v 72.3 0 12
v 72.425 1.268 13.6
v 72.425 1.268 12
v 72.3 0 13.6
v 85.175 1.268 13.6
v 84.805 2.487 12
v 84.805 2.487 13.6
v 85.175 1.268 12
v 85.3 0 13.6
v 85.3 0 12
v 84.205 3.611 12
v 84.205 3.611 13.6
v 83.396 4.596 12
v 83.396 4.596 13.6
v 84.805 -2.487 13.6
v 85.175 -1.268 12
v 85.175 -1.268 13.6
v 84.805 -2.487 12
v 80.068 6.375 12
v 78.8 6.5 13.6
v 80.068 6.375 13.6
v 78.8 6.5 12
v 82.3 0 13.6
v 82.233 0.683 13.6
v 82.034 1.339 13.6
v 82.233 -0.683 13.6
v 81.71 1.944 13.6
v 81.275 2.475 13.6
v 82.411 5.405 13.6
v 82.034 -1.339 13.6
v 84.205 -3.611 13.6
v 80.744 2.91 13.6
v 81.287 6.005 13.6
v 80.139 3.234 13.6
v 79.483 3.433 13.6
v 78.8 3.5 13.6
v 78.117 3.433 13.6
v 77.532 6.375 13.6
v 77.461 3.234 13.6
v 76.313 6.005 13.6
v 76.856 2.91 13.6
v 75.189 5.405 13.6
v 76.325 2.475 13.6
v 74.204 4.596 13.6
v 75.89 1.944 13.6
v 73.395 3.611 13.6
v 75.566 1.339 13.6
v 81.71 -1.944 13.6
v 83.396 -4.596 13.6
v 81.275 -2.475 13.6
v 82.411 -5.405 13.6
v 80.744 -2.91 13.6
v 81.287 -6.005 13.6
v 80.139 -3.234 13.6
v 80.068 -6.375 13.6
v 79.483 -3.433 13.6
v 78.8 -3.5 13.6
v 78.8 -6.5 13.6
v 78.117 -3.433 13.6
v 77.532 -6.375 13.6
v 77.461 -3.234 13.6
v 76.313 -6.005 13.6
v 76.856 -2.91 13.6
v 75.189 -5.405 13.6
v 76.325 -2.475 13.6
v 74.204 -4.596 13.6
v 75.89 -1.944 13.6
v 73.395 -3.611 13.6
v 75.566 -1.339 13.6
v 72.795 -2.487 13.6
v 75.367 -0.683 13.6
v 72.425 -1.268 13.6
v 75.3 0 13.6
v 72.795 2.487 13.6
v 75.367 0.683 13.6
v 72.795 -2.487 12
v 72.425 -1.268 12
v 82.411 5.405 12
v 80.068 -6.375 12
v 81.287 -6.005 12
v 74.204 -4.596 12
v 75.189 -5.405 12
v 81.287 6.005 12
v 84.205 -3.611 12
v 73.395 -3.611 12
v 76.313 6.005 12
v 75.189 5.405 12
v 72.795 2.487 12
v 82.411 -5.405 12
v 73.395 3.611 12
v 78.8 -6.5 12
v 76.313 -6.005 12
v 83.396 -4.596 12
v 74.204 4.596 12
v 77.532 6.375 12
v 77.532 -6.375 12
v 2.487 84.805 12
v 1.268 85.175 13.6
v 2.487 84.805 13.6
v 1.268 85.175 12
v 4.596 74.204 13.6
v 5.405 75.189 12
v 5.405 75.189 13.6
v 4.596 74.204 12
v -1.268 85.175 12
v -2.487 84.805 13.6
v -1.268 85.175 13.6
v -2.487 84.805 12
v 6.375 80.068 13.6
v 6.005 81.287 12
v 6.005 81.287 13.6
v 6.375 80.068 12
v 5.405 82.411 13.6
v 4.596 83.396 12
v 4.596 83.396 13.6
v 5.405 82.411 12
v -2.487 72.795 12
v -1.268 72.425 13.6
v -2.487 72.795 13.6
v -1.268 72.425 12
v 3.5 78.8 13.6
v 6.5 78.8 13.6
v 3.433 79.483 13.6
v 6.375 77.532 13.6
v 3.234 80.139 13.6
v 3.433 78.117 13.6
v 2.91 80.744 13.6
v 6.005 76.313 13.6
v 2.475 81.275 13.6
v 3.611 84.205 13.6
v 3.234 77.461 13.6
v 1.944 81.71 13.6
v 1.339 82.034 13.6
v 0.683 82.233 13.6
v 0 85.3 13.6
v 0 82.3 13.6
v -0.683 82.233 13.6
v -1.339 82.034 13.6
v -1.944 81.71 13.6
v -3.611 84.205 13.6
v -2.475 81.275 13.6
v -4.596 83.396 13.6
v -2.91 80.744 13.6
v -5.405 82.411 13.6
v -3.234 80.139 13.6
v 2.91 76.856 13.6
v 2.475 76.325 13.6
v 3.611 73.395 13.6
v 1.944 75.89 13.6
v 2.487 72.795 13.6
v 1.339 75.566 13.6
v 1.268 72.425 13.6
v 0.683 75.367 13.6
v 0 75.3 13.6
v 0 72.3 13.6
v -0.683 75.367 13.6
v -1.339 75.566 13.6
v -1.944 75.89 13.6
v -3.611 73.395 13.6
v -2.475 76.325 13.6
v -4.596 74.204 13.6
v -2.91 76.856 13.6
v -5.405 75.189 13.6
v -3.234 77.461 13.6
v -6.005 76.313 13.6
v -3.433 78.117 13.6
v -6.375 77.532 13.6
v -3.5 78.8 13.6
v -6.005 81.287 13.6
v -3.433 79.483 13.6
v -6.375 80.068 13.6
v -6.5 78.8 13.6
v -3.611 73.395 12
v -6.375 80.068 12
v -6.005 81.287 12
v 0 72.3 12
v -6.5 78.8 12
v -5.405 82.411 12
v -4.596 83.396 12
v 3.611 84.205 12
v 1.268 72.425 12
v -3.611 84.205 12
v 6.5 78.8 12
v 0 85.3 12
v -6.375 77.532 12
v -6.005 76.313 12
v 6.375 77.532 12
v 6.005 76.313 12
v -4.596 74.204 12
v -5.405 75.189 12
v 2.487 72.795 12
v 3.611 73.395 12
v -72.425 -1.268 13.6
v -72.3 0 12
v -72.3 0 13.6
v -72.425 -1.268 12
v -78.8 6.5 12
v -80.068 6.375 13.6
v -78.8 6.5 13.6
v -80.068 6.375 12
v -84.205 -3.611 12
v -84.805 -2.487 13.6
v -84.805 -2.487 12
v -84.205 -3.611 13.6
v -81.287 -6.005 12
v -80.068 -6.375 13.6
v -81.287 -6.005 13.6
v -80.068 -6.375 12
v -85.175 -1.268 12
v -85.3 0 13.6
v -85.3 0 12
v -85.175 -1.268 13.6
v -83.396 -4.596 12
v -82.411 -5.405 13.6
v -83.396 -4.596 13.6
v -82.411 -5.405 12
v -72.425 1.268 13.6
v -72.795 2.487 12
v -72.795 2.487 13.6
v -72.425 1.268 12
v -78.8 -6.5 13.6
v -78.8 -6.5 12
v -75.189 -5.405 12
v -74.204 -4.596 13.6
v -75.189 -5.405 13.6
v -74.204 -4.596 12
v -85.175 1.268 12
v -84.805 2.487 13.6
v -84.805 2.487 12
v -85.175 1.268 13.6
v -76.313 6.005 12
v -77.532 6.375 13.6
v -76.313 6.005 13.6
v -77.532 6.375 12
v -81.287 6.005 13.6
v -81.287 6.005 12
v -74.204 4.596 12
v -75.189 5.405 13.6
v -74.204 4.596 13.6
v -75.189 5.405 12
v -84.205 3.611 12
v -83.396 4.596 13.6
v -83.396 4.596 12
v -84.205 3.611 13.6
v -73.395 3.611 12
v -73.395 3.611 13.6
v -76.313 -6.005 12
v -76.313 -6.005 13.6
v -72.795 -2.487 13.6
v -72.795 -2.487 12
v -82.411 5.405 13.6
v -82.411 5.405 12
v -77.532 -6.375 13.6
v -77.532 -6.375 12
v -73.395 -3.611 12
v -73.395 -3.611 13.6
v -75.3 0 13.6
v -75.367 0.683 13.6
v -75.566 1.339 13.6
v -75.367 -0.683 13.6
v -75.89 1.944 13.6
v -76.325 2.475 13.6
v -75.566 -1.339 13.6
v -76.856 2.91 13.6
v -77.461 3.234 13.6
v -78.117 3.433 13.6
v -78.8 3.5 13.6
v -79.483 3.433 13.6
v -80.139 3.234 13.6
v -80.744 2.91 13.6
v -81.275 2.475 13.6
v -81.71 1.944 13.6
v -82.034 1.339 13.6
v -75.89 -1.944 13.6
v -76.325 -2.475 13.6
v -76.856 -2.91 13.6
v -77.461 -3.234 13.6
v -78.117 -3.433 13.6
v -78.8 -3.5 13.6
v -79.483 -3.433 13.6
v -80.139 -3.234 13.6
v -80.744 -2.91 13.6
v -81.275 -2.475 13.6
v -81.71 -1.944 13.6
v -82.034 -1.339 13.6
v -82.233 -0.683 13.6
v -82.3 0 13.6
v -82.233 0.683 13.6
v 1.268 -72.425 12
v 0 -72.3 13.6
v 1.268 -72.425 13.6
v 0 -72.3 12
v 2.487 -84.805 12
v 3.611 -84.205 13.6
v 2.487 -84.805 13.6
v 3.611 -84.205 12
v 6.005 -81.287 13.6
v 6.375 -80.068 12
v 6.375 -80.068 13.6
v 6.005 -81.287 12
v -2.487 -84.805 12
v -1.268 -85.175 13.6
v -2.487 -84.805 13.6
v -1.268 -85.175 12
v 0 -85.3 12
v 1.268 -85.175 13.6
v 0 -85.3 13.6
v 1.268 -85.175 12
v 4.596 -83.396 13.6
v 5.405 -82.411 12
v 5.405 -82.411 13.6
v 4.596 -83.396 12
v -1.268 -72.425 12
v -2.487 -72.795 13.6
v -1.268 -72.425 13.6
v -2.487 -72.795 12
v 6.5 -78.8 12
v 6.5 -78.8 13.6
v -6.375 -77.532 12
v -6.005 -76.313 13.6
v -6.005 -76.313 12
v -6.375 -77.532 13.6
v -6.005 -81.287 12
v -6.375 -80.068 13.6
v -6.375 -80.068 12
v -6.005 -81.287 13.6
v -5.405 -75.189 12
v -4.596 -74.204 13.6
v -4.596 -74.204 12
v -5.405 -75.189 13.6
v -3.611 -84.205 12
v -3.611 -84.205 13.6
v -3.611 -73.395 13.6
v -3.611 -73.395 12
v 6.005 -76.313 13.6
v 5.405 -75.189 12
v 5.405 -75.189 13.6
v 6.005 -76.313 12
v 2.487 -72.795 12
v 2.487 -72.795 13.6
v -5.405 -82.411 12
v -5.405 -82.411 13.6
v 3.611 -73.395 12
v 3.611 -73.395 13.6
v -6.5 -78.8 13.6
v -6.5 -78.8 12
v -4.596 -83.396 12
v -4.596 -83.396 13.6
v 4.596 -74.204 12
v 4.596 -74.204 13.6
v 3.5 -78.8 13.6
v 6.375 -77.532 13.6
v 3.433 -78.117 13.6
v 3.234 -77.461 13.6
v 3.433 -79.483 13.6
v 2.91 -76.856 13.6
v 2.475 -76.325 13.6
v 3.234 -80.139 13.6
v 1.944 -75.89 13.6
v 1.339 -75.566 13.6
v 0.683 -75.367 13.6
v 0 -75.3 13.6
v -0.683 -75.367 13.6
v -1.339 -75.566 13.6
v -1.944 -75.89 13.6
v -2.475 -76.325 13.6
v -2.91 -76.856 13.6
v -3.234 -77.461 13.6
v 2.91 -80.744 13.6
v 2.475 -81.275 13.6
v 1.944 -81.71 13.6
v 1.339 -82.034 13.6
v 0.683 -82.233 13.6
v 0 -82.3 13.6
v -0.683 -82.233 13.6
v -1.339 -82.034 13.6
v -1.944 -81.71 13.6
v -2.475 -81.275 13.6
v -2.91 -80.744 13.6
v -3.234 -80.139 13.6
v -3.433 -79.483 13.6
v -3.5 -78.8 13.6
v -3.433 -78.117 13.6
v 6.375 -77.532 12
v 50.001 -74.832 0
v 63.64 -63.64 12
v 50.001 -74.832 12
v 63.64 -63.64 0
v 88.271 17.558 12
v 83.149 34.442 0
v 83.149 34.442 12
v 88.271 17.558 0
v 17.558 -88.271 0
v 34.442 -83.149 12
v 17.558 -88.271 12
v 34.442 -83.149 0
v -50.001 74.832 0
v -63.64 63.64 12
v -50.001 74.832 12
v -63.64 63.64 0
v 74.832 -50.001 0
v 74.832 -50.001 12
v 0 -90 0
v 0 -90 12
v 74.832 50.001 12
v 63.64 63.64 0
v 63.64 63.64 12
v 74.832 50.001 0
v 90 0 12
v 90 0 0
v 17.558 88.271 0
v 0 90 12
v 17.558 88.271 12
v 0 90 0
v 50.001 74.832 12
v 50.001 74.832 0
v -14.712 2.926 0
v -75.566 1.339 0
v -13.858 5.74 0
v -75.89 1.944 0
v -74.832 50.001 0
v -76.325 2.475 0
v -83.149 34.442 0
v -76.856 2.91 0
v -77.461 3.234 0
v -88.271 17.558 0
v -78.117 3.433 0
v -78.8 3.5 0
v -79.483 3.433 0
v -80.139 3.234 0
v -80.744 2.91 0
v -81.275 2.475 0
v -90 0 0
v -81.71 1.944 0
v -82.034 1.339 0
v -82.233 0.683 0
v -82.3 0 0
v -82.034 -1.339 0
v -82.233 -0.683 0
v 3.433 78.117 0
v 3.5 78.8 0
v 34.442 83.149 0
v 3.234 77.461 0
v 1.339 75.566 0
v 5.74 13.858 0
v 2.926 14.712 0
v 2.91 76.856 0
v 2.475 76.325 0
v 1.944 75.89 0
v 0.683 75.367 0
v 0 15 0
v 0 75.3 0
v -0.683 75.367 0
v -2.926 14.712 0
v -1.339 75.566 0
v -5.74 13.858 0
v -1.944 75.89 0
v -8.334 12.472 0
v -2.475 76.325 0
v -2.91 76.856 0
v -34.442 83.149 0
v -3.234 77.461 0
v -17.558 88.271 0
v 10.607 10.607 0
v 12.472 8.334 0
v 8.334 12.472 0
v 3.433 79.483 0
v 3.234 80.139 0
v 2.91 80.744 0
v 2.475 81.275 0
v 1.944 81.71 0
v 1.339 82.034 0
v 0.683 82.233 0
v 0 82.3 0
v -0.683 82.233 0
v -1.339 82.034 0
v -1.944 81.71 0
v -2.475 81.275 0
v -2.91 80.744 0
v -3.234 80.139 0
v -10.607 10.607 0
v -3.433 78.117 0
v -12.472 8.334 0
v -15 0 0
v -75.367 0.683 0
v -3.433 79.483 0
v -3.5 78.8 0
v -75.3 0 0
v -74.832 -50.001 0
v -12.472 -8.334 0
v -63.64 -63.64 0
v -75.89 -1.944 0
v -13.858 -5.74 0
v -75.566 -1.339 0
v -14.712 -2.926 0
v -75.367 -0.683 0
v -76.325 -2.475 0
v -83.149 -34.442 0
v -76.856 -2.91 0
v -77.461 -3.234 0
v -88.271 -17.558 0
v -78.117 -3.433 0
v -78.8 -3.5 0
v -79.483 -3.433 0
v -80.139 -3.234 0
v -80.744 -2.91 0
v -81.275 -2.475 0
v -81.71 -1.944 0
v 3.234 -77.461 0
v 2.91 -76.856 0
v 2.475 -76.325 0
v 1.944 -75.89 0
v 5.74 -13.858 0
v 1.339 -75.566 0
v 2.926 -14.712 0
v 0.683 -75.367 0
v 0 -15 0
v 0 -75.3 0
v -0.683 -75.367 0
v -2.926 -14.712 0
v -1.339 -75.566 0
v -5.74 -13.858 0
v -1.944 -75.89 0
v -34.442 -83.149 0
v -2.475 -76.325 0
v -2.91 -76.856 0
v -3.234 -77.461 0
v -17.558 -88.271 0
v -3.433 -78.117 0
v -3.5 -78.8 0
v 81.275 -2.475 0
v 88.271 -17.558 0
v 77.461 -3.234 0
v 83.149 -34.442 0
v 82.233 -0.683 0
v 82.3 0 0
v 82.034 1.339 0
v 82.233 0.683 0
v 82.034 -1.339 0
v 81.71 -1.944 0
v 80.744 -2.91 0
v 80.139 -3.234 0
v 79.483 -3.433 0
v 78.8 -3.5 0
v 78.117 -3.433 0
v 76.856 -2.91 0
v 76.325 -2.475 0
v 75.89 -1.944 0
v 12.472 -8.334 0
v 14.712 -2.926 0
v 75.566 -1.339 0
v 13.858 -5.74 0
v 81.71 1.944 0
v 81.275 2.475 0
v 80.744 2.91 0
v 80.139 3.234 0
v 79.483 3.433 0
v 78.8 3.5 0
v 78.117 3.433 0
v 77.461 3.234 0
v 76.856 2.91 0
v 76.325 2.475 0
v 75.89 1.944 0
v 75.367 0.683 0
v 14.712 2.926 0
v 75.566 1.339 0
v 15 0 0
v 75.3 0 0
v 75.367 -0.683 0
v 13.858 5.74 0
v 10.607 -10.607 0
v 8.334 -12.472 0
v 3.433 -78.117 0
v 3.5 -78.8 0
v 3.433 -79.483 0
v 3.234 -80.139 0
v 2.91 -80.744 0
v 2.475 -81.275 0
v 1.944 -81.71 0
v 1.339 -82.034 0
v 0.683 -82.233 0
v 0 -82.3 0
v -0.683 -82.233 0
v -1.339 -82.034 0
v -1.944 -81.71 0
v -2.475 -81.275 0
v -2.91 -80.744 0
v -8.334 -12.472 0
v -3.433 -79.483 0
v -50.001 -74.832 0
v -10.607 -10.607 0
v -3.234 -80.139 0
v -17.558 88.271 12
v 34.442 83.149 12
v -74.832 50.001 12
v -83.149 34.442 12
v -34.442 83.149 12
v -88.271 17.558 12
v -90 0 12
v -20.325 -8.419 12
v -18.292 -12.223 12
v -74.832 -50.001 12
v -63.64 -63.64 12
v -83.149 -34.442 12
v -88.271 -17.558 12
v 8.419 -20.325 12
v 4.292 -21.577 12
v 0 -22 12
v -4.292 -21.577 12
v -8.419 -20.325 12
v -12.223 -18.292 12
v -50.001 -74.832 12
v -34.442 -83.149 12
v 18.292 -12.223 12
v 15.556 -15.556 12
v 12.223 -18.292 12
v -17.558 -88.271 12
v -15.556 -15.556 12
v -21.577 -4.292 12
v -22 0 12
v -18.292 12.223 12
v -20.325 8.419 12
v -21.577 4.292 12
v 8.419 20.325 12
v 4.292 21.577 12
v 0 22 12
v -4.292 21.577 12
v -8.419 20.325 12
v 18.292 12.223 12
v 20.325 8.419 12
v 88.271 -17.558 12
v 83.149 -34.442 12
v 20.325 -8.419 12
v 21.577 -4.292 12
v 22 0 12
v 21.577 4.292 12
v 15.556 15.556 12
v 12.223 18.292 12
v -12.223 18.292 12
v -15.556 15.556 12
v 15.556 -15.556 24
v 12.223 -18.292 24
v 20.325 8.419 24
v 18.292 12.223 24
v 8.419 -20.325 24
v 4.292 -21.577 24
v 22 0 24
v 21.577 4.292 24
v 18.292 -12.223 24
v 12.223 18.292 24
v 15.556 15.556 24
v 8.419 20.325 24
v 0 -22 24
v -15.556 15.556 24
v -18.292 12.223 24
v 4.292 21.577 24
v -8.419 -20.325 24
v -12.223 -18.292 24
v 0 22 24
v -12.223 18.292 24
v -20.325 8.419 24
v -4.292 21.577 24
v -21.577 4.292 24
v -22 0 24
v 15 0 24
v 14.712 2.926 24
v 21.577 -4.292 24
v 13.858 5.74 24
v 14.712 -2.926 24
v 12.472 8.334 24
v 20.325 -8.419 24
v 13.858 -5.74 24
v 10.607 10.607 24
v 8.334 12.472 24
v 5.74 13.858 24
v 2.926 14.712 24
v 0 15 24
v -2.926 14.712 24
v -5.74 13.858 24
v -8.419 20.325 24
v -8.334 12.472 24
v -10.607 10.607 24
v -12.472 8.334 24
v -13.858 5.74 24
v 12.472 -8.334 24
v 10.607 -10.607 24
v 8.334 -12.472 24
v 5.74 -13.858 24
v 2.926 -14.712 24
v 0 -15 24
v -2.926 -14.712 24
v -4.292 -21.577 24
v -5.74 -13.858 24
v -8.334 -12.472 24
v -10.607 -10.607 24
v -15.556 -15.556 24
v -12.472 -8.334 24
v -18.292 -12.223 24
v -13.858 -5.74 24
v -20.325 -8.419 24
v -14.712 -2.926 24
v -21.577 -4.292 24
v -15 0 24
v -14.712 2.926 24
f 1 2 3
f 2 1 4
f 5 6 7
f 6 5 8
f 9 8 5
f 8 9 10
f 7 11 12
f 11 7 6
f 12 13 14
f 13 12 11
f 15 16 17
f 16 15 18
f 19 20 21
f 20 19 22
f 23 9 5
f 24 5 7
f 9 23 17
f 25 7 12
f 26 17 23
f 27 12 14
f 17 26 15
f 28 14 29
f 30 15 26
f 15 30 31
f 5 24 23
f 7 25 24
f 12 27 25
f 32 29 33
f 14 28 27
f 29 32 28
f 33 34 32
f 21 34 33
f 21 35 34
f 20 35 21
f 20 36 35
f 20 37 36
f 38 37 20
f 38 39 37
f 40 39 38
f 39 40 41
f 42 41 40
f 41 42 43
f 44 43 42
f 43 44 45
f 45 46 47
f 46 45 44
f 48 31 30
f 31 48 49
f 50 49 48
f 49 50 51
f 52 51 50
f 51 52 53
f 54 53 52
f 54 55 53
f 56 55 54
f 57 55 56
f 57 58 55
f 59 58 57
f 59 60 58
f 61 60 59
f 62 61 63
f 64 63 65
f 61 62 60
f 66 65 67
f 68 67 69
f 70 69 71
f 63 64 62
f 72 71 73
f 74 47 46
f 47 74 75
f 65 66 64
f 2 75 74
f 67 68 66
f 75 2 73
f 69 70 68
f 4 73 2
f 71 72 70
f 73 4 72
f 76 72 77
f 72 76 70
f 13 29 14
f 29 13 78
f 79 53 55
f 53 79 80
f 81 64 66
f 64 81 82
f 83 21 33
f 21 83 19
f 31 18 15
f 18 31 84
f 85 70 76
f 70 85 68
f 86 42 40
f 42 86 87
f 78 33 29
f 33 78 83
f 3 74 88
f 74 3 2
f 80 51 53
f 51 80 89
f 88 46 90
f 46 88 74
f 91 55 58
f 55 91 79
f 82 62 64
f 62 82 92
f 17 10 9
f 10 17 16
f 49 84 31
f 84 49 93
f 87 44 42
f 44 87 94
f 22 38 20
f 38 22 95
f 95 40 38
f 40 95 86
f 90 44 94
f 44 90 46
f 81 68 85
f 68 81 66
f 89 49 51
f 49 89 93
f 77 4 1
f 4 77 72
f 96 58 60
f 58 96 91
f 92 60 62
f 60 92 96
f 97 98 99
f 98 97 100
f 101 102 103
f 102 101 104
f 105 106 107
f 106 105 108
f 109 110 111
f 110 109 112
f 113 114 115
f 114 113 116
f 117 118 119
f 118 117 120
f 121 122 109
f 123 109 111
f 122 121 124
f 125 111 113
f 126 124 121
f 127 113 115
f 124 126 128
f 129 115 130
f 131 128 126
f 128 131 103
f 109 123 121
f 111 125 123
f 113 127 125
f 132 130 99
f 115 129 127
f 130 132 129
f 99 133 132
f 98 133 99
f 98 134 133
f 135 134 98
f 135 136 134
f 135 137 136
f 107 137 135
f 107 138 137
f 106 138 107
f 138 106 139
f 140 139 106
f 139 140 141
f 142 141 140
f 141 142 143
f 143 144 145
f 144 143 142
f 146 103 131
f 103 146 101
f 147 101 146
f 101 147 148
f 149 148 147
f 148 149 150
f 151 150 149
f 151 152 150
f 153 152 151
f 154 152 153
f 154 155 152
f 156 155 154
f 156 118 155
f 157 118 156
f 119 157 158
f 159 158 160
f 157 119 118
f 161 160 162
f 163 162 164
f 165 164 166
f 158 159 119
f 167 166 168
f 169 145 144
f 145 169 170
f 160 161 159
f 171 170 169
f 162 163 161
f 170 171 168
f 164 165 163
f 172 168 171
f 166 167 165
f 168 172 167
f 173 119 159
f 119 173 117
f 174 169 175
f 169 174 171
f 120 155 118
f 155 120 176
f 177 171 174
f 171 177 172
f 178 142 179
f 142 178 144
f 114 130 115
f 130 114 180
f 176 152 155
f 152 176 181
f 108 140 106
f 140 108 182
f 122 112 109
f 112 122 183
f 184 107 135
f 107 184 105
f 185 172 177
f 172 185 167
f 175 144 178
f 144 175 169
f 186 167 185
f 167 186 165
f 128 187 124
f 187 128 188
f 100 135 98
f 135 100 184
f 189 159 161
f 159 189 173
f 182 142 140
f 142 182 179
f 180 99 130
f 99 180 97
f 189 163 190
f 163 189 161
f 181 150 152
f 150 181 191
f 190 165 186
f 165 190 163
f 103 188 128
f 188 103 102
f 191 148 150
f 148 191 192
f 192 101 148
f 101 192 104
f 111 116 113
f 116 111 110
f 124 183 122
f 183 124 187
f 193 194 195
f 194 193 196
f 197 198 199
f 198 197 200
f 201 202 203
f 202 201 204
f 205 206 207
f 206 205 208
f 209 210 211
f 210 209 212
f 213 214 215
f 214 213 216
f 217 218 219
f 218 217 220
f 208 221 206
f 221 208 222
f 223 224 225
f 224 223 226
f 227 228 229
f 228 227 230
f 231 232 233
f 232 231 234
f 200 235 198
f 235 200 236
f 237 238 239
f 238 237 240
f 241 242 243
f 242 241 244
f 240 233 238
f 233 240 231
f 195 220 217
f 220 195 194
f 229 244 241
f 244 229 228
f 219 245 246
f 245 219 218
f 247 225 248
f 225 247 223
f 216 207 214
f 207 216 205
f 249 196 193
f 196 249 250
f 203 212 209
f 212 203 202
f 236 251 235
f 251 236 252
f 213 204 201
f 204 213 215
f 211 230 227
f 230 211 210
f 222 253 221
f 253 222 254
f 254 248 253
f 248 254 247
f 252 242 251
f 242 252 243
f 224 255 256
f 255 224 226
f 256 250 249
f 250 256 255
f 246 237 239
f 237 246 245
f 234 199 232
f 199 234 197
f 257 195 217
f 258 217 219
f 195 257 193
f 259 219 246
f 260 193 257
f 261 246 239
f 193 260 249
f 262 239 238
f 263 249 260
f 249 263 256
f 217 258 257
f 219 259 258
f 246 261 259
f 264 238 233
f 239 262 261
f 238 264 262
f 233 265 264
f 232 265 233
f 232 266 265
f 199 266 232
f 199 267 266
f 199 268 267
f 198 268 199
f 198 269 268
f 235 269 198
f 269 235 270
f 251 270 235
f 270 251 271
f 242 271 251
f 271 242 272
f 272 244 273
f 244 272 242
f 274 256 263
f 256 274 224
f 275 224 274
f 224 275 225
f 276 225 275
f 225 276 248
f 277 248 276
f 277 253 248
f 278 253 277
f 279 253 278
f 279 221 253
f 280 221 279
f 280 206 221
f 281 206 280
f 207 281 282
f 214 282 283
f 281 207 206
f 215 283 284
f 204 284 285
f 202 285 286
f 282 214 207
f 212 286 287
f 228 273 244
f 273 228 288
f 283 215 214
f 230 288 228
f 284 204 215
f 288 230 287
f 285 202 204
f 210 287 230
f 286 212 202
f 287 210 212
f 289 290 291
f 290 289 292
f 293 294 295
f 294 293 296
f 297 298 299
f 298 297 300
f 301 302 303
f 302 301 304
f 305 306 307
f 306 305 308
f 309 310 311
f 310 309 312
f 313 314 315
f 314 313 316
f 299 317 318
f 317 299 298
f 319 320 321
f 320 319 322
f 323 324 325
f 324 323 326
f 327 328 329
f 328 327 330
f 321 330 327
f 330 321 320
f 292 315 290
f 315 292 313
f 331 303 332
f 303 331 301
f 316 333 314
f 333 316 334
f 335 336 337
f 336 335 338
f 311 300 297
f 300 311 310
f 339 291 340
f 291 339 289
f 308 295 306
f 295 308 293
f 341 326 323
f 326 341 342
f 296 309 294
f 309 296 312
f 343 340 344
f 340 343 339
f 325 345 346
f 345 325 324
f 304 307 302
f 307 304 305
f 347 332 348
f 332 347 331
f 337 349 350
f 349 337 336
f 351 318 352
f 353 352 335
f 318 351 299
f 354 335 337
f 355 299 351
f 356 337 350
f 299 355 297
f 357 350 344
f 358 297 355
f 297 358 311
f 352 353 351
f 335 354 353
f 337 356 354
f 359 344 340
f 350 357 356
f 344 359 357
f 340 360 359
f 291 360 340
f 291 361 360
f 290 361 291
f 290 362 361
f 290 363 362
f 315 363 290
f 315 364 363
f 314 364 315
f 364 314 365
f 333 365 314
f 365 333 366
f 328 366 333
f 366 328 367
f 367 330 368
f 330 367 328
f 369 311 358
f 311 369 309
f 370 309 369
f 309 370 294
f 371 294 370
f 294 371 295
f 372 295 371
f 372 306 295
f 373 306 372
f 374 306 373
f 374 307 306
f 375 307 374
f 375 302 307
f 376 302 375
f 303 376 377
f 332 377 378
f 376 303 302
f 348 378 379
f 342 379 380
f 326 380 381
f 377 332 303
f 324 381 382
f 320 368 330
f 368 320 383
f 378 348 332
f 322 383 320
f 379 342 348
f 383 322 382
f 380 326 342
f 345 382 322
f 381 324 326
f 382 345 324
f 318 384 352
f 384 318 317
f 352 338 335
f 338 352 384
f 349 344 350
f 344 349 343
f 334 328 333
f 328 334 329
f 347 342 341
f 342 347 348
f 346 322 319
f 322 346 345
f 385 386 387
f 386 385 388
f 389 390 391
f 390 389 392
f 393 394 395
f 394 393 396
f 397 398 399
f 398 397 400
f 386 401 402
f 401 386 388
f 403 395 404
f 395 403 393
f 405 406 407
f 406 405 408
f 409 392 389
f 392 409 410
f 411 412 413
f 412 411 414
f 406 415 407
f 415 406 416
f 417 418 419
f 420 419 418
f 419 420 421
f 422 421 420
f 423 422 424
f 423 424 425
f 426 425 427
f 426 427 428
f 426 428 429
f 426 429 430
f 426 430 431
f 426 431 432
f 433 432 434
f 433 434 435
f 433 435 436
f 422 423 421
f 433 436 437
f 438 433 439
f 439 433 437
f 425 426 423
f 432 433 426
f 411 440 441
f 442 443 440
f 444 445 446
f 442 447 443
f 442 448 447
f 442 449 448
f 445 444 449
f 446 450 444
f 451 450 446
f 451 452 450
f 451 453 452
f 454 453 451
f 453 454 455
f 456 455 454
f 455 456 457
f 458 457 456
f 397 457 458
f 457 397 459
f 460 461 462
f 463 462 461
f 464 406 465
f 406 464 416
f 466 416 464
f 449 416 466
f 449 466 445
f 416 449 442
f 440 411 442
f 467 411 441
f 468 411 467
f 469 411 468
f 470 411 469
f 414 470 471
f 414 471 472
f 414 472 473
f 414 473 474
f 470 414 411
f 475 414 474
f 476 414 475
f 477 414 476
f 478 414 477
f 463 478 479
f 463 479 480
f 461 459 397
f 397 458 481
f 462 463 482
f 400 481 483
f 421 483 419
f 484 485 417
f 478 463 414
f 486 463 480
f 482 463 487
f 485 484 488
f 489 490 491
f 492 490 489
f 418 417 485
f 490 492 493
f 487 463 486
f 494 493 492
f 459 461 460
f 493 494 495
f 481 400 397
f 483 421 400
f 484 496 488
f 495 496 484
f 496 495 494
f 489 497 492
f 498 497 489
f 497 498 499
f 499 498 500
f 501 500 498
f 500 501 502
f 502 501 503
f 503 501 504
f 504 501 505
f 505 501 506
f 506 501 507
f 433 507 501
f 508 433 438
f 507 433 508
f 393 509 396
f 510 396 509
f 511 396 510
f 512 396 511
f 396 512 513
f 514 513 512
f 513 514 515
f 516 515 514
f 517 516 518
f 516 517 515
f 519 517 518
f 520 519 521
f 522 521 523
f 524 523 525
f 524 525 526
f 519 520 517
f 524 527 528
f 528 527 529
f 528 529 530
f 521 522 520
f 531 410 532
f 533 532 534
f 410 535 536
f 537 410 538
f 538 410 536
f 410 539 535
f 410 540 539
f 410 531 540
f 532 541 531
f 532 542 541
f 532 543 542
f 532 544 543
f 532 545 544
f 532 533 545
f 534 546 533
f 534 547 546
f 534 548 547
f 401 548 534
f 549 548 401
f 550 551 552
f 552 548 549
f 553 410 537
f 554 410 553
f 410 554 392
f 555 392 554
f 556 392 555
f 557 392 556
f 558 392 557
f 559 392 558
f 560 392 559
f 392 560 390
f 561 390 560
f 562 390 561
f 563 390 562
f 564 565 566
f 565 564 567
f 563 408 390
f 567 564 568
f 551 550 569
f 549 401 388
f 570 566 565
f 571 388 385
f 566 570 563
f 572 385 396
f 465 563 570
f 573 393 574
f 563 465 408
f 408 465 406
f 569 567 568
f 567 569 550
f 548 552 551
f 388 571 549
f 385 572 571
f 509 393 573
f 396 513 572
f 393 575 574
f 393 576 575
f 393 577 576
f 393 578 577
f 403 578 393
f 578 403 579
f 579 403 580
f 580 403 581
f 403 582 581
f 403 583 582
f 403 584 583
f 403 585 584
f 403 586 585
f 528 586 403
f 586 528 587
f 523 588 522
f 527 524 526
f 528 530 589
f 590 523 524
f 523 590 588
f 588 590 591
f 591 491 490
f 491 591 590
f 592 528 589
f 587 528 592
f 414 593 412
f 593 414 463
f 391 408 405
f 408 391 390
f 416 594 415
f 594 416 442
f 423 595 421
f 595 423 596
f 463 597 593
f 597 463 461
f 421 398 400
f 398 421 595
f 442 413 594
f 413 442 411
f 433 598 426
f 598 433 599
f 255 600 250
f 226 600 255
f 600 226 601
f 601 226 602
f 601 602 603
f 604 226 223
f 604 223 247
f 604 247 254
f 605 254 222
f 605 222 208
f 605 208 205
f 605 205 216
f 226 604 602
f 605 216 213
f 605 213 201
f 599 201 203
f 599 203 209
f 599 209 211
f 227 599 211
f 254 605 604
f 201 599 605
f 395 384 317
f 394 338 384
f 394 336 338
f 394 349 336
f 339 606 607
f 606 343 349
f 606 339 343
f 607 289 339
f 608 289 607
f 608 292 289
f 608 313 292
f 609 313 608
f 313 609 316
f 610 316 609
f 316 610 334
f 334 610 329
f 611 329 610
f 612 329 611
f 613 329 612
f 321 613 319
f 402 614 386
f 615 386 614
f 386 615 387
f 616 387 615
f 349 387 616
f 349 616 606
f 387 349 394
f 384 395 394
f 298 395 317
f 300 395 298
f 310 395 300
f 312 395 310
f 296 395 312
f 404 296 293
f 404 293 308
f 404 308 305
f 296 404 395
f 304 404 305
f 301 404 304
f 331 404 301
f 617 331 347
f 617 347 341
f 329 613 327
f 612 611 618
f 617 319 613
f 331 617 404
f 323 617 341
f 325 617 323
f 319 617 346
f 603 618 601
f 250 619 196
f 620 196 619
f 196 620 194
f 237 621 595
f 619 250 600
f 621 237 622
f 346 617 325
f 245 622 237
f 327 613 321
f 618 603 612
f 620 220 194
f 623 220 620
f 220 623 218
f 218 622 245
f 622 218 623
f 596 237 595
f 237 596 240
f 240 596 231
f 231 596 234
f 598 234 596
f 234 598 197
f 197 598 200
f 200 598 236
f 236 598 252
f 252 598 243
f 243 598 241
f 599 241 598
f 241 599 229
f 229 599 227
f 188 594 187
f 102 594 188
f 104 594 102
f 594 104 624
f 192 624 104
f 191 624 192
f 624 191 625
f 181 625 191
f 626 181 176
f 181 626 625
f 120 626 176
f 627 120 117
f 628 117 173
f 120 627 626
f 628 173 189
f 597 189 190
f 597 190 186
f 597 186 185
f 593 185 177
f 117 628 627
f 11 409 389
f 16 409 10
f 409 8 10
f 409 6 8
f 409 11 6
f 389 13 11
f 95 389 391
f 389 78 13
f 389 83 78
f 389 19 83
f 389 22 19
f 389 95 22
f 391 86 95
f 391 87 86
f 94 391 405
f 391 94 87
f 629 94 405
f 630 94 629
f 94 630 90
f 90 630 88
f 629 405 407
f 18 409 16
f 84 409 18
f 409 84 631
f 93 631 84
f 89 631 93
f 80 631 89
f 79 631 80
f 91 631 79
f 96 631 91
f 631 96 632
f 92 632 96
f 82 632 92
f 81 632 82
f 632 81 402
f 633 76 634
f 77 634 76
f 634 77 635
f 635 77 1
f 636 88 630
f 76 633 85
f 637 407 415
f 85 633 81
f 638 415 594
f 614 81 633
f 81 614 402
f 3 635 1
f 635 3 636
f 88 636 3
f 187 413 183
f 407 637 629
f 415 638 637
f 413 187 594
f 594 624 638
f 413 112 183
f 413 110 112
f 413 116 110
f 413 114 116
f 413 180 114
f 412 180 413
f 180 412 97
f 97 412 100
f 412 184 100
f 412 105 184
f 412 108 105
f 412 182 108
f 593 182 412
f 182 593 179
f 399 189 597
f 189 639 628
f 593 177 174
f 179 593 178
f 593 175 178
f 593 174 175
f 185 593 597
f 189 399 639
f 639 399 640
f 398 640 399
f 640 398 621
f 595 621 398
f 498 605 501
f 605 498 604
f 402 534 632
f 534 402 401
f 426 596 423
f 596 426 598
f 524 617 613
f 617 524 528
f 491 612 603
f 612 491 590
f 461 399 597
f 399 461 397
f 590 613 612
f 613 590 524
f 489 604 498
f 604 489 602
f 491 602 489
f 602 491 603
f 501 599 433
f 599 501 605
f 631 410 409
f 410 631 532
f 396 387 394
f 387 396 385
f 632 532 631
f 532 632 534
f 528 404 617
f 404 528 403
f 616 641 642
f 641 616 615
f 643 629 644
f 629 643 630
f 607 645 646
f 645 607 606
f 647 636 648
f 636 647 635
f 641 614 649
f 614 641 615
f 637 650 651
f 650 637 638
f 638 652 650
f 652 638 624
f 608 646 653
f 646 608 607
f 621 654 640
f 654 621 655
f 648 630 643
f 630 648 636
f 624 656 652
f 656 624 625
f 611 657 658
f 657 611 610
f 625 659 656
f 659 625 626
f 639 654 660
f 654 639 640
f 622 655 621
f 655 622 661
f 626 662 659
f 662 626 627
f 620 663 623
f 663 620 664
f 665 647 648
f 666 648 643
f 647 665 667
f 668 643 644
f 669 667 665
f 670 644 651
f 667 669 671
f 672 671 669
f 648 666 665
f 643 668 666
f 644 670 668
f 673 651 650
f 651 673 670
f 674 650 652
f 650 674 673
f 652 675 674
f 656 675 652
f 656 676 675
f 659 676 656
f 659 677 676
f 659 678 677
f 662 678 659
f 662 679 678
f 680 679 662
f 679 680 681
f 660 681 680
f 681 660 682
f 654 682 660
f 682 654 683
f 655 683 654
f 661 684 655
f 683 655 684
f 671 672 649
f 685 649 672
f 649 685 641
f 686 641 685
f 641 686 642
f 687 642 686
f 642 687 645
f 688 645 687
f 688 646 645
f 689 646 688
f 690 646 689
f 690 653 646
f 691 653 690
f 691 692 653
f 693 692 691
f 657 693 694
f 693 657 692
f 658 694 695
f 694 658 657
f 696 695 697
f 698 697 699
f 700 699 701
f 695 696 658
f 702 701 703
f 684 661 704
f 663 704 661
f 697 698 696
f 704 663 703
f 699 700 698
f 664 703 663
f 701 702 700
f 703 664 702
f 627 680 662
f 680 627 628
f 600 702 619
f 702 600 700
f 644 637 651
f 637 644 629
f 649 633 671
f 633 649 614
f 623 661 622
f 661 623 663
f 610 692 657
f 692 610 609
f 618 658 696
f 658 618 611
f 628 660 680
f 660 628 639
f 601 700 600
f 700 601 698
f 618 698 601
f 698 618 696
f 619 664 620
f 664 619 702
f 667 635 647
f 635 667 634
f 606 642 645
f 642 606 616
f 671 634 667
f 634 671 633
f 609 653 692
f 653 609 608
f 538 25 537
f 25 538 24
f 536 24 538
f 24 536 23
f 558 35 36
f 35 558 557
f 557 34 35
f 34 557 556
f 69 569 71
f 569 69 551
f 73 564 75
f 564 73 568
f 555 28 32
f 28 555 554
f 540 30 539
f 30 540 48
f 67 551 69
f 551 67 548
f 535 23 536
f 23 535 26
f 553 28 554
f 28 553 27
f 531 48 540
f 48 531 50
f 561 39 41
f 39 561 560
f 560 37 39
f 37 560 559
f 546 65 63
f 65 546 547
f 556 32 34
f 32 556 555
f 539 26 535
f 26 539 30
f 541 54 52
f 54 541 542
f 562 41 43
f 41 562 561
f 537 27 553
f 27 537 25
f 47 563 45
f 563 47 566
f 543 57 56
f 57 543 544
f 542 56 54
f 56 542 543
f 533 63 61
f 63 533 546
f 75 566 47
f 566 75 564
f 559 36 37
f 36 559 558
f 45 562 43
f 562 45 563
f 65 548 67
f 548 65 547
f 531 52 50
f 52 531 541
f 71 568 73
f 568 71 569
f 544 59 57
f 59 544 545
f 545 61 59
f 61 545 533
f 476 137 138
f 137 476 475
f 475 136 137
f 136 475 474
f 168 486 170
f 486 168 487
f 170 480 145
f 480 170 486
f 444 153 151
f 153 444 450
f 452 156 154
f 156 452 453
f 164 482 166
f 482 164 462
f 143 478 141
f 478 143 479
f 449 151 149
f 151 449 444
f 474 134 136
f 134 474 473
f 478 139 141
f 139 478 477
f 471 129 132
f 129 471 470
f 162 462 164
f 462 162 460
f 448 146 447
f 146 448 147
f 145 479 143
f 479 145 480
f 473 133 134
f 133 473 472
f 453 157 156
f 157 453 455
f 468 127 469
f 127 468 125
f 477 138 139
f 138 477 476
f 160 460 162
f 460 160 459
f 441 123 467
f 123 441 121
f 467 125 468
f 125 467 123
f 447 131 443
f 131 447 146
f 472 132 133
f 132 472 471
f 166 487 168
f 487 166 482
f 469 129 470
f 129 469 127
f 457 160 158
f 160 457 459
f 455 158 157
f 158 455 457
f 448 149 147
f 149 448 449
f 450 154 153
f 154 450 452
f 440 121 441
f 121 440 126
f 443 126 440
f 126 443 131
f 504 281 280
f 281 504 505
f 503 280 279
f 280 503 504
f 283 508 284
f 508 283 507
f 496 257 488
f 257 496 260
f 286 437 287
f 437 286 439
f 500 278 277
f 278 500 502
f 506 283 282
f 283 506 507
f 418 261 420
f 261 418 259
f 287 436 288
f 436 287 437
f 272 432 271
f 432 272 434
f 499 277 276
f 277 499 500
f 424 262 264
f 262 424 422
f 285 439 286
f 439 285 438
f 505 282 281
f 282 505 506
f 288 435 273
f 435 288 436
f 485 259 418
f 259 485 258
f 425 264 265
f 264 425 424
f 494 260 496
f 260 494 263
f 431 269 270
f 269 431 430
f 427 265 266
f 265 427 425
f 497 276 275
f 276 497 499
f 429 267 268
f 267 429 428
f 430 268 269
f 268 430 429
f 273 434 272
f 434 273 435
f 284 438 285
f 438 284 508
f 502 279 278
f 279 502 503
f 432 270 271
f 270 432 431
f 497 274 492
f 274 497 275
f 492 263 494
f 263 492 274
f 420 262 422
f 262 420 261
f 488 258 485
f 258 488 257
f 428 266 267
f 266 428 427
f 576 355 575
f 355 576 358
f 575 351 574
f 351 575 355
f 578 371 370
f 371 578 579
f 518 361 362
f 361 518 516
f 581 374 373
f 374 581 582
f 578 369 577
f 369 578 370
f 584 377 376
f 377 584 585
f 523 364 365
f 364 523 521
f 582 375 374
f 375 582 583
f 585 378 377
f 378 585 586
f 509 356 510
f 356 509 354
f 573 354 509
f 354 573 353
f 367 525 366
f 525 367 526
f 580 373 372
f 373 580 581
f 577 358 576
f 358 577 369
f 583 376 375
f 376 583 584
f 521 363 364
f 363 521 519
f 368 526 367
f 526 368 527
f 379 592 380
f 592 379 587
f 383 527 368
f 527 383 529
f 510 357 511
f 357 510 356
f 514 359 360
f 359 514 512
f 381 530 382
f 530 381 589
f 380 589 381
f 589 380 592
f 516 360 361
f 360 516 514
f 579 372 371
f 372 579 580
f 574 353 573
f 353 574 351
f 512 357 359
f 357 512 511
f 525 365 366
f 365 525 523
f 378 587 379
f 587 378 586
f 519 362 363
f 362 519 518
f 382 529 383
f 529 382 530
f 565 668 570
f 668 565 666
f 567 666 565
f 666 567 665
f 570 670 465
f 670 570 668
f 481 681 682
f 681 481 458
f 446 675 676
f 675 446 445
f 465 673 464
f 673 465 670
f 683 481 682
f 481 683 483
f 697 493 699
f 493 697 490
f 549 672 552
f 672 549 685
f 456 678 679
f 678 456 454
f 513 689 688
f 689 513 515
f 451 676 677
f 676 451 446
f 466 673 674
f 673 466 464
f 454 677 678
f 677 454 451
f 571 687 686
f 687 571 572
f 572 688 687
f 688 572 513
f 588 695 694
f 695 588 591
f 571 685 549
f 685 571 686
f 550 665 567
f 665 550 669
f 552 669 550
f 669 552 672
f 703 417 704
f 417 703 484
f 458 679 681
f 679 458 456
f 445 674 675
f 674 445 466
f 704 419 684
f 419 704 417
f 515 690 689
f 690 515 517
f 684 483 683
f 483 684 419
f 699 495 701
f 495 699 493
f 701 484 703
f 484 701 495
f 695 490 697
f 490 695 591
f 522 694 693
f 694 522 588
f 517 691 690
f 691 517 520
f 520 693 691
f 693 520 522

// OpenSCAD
$fn = 32;

// ----------------------------------------------------------------------
// Bolt-circle flange: 180 mm outside, 4 bolt holes, bore 30 mm
// ----------------------------------------------------------------------

// --- parameters (mm) ---
flange_d = 180;           // flange outside diameter
flange_t = 12;            // flange thickness
bolts = 4;                // number of bolt holes
bolt_d = 7;               // bolt clearance
bolt_r = 78.8;            // bolt circle radius
bore_d = 30;              // centre bore
hub_d = 44;               // raised hub diameter
hub_h = 12;               // raised hub height
spot_d = 13;              // spot faced bosses
spot_h = 1.6;             // spot face height

module body() {
  cylinder(h = flange_t, d = flange_d);
  /* raised hub, sunk 1 mm into the flange */
  translate([0, 0, flange_t - 1]) cylinder(h = hub_h + 1, d = hub_d);
  /* spot faced pads under the bolt heads */
  for (i = [0 : bolts - 1]) rotate([0, 0, i * 360 / bolts]) translate([bolt_r, 0, flange_t - 1]) cylinder(h = spot_h + 1, d = spot_d);
}

difference() {
  body();
  /* bolt circle */
  for (i = [0 : bolts - 1]) rotate([0, 0, i * 360 / bolts]) translate([bolt_r, 0, -1]) cylinder(h = flange_t + hub_h + 3, d = bolt_d);
  translate([0, 0, -1]) cylinder(h = flange_t + hub_h + 3, d = bore_d);
}
